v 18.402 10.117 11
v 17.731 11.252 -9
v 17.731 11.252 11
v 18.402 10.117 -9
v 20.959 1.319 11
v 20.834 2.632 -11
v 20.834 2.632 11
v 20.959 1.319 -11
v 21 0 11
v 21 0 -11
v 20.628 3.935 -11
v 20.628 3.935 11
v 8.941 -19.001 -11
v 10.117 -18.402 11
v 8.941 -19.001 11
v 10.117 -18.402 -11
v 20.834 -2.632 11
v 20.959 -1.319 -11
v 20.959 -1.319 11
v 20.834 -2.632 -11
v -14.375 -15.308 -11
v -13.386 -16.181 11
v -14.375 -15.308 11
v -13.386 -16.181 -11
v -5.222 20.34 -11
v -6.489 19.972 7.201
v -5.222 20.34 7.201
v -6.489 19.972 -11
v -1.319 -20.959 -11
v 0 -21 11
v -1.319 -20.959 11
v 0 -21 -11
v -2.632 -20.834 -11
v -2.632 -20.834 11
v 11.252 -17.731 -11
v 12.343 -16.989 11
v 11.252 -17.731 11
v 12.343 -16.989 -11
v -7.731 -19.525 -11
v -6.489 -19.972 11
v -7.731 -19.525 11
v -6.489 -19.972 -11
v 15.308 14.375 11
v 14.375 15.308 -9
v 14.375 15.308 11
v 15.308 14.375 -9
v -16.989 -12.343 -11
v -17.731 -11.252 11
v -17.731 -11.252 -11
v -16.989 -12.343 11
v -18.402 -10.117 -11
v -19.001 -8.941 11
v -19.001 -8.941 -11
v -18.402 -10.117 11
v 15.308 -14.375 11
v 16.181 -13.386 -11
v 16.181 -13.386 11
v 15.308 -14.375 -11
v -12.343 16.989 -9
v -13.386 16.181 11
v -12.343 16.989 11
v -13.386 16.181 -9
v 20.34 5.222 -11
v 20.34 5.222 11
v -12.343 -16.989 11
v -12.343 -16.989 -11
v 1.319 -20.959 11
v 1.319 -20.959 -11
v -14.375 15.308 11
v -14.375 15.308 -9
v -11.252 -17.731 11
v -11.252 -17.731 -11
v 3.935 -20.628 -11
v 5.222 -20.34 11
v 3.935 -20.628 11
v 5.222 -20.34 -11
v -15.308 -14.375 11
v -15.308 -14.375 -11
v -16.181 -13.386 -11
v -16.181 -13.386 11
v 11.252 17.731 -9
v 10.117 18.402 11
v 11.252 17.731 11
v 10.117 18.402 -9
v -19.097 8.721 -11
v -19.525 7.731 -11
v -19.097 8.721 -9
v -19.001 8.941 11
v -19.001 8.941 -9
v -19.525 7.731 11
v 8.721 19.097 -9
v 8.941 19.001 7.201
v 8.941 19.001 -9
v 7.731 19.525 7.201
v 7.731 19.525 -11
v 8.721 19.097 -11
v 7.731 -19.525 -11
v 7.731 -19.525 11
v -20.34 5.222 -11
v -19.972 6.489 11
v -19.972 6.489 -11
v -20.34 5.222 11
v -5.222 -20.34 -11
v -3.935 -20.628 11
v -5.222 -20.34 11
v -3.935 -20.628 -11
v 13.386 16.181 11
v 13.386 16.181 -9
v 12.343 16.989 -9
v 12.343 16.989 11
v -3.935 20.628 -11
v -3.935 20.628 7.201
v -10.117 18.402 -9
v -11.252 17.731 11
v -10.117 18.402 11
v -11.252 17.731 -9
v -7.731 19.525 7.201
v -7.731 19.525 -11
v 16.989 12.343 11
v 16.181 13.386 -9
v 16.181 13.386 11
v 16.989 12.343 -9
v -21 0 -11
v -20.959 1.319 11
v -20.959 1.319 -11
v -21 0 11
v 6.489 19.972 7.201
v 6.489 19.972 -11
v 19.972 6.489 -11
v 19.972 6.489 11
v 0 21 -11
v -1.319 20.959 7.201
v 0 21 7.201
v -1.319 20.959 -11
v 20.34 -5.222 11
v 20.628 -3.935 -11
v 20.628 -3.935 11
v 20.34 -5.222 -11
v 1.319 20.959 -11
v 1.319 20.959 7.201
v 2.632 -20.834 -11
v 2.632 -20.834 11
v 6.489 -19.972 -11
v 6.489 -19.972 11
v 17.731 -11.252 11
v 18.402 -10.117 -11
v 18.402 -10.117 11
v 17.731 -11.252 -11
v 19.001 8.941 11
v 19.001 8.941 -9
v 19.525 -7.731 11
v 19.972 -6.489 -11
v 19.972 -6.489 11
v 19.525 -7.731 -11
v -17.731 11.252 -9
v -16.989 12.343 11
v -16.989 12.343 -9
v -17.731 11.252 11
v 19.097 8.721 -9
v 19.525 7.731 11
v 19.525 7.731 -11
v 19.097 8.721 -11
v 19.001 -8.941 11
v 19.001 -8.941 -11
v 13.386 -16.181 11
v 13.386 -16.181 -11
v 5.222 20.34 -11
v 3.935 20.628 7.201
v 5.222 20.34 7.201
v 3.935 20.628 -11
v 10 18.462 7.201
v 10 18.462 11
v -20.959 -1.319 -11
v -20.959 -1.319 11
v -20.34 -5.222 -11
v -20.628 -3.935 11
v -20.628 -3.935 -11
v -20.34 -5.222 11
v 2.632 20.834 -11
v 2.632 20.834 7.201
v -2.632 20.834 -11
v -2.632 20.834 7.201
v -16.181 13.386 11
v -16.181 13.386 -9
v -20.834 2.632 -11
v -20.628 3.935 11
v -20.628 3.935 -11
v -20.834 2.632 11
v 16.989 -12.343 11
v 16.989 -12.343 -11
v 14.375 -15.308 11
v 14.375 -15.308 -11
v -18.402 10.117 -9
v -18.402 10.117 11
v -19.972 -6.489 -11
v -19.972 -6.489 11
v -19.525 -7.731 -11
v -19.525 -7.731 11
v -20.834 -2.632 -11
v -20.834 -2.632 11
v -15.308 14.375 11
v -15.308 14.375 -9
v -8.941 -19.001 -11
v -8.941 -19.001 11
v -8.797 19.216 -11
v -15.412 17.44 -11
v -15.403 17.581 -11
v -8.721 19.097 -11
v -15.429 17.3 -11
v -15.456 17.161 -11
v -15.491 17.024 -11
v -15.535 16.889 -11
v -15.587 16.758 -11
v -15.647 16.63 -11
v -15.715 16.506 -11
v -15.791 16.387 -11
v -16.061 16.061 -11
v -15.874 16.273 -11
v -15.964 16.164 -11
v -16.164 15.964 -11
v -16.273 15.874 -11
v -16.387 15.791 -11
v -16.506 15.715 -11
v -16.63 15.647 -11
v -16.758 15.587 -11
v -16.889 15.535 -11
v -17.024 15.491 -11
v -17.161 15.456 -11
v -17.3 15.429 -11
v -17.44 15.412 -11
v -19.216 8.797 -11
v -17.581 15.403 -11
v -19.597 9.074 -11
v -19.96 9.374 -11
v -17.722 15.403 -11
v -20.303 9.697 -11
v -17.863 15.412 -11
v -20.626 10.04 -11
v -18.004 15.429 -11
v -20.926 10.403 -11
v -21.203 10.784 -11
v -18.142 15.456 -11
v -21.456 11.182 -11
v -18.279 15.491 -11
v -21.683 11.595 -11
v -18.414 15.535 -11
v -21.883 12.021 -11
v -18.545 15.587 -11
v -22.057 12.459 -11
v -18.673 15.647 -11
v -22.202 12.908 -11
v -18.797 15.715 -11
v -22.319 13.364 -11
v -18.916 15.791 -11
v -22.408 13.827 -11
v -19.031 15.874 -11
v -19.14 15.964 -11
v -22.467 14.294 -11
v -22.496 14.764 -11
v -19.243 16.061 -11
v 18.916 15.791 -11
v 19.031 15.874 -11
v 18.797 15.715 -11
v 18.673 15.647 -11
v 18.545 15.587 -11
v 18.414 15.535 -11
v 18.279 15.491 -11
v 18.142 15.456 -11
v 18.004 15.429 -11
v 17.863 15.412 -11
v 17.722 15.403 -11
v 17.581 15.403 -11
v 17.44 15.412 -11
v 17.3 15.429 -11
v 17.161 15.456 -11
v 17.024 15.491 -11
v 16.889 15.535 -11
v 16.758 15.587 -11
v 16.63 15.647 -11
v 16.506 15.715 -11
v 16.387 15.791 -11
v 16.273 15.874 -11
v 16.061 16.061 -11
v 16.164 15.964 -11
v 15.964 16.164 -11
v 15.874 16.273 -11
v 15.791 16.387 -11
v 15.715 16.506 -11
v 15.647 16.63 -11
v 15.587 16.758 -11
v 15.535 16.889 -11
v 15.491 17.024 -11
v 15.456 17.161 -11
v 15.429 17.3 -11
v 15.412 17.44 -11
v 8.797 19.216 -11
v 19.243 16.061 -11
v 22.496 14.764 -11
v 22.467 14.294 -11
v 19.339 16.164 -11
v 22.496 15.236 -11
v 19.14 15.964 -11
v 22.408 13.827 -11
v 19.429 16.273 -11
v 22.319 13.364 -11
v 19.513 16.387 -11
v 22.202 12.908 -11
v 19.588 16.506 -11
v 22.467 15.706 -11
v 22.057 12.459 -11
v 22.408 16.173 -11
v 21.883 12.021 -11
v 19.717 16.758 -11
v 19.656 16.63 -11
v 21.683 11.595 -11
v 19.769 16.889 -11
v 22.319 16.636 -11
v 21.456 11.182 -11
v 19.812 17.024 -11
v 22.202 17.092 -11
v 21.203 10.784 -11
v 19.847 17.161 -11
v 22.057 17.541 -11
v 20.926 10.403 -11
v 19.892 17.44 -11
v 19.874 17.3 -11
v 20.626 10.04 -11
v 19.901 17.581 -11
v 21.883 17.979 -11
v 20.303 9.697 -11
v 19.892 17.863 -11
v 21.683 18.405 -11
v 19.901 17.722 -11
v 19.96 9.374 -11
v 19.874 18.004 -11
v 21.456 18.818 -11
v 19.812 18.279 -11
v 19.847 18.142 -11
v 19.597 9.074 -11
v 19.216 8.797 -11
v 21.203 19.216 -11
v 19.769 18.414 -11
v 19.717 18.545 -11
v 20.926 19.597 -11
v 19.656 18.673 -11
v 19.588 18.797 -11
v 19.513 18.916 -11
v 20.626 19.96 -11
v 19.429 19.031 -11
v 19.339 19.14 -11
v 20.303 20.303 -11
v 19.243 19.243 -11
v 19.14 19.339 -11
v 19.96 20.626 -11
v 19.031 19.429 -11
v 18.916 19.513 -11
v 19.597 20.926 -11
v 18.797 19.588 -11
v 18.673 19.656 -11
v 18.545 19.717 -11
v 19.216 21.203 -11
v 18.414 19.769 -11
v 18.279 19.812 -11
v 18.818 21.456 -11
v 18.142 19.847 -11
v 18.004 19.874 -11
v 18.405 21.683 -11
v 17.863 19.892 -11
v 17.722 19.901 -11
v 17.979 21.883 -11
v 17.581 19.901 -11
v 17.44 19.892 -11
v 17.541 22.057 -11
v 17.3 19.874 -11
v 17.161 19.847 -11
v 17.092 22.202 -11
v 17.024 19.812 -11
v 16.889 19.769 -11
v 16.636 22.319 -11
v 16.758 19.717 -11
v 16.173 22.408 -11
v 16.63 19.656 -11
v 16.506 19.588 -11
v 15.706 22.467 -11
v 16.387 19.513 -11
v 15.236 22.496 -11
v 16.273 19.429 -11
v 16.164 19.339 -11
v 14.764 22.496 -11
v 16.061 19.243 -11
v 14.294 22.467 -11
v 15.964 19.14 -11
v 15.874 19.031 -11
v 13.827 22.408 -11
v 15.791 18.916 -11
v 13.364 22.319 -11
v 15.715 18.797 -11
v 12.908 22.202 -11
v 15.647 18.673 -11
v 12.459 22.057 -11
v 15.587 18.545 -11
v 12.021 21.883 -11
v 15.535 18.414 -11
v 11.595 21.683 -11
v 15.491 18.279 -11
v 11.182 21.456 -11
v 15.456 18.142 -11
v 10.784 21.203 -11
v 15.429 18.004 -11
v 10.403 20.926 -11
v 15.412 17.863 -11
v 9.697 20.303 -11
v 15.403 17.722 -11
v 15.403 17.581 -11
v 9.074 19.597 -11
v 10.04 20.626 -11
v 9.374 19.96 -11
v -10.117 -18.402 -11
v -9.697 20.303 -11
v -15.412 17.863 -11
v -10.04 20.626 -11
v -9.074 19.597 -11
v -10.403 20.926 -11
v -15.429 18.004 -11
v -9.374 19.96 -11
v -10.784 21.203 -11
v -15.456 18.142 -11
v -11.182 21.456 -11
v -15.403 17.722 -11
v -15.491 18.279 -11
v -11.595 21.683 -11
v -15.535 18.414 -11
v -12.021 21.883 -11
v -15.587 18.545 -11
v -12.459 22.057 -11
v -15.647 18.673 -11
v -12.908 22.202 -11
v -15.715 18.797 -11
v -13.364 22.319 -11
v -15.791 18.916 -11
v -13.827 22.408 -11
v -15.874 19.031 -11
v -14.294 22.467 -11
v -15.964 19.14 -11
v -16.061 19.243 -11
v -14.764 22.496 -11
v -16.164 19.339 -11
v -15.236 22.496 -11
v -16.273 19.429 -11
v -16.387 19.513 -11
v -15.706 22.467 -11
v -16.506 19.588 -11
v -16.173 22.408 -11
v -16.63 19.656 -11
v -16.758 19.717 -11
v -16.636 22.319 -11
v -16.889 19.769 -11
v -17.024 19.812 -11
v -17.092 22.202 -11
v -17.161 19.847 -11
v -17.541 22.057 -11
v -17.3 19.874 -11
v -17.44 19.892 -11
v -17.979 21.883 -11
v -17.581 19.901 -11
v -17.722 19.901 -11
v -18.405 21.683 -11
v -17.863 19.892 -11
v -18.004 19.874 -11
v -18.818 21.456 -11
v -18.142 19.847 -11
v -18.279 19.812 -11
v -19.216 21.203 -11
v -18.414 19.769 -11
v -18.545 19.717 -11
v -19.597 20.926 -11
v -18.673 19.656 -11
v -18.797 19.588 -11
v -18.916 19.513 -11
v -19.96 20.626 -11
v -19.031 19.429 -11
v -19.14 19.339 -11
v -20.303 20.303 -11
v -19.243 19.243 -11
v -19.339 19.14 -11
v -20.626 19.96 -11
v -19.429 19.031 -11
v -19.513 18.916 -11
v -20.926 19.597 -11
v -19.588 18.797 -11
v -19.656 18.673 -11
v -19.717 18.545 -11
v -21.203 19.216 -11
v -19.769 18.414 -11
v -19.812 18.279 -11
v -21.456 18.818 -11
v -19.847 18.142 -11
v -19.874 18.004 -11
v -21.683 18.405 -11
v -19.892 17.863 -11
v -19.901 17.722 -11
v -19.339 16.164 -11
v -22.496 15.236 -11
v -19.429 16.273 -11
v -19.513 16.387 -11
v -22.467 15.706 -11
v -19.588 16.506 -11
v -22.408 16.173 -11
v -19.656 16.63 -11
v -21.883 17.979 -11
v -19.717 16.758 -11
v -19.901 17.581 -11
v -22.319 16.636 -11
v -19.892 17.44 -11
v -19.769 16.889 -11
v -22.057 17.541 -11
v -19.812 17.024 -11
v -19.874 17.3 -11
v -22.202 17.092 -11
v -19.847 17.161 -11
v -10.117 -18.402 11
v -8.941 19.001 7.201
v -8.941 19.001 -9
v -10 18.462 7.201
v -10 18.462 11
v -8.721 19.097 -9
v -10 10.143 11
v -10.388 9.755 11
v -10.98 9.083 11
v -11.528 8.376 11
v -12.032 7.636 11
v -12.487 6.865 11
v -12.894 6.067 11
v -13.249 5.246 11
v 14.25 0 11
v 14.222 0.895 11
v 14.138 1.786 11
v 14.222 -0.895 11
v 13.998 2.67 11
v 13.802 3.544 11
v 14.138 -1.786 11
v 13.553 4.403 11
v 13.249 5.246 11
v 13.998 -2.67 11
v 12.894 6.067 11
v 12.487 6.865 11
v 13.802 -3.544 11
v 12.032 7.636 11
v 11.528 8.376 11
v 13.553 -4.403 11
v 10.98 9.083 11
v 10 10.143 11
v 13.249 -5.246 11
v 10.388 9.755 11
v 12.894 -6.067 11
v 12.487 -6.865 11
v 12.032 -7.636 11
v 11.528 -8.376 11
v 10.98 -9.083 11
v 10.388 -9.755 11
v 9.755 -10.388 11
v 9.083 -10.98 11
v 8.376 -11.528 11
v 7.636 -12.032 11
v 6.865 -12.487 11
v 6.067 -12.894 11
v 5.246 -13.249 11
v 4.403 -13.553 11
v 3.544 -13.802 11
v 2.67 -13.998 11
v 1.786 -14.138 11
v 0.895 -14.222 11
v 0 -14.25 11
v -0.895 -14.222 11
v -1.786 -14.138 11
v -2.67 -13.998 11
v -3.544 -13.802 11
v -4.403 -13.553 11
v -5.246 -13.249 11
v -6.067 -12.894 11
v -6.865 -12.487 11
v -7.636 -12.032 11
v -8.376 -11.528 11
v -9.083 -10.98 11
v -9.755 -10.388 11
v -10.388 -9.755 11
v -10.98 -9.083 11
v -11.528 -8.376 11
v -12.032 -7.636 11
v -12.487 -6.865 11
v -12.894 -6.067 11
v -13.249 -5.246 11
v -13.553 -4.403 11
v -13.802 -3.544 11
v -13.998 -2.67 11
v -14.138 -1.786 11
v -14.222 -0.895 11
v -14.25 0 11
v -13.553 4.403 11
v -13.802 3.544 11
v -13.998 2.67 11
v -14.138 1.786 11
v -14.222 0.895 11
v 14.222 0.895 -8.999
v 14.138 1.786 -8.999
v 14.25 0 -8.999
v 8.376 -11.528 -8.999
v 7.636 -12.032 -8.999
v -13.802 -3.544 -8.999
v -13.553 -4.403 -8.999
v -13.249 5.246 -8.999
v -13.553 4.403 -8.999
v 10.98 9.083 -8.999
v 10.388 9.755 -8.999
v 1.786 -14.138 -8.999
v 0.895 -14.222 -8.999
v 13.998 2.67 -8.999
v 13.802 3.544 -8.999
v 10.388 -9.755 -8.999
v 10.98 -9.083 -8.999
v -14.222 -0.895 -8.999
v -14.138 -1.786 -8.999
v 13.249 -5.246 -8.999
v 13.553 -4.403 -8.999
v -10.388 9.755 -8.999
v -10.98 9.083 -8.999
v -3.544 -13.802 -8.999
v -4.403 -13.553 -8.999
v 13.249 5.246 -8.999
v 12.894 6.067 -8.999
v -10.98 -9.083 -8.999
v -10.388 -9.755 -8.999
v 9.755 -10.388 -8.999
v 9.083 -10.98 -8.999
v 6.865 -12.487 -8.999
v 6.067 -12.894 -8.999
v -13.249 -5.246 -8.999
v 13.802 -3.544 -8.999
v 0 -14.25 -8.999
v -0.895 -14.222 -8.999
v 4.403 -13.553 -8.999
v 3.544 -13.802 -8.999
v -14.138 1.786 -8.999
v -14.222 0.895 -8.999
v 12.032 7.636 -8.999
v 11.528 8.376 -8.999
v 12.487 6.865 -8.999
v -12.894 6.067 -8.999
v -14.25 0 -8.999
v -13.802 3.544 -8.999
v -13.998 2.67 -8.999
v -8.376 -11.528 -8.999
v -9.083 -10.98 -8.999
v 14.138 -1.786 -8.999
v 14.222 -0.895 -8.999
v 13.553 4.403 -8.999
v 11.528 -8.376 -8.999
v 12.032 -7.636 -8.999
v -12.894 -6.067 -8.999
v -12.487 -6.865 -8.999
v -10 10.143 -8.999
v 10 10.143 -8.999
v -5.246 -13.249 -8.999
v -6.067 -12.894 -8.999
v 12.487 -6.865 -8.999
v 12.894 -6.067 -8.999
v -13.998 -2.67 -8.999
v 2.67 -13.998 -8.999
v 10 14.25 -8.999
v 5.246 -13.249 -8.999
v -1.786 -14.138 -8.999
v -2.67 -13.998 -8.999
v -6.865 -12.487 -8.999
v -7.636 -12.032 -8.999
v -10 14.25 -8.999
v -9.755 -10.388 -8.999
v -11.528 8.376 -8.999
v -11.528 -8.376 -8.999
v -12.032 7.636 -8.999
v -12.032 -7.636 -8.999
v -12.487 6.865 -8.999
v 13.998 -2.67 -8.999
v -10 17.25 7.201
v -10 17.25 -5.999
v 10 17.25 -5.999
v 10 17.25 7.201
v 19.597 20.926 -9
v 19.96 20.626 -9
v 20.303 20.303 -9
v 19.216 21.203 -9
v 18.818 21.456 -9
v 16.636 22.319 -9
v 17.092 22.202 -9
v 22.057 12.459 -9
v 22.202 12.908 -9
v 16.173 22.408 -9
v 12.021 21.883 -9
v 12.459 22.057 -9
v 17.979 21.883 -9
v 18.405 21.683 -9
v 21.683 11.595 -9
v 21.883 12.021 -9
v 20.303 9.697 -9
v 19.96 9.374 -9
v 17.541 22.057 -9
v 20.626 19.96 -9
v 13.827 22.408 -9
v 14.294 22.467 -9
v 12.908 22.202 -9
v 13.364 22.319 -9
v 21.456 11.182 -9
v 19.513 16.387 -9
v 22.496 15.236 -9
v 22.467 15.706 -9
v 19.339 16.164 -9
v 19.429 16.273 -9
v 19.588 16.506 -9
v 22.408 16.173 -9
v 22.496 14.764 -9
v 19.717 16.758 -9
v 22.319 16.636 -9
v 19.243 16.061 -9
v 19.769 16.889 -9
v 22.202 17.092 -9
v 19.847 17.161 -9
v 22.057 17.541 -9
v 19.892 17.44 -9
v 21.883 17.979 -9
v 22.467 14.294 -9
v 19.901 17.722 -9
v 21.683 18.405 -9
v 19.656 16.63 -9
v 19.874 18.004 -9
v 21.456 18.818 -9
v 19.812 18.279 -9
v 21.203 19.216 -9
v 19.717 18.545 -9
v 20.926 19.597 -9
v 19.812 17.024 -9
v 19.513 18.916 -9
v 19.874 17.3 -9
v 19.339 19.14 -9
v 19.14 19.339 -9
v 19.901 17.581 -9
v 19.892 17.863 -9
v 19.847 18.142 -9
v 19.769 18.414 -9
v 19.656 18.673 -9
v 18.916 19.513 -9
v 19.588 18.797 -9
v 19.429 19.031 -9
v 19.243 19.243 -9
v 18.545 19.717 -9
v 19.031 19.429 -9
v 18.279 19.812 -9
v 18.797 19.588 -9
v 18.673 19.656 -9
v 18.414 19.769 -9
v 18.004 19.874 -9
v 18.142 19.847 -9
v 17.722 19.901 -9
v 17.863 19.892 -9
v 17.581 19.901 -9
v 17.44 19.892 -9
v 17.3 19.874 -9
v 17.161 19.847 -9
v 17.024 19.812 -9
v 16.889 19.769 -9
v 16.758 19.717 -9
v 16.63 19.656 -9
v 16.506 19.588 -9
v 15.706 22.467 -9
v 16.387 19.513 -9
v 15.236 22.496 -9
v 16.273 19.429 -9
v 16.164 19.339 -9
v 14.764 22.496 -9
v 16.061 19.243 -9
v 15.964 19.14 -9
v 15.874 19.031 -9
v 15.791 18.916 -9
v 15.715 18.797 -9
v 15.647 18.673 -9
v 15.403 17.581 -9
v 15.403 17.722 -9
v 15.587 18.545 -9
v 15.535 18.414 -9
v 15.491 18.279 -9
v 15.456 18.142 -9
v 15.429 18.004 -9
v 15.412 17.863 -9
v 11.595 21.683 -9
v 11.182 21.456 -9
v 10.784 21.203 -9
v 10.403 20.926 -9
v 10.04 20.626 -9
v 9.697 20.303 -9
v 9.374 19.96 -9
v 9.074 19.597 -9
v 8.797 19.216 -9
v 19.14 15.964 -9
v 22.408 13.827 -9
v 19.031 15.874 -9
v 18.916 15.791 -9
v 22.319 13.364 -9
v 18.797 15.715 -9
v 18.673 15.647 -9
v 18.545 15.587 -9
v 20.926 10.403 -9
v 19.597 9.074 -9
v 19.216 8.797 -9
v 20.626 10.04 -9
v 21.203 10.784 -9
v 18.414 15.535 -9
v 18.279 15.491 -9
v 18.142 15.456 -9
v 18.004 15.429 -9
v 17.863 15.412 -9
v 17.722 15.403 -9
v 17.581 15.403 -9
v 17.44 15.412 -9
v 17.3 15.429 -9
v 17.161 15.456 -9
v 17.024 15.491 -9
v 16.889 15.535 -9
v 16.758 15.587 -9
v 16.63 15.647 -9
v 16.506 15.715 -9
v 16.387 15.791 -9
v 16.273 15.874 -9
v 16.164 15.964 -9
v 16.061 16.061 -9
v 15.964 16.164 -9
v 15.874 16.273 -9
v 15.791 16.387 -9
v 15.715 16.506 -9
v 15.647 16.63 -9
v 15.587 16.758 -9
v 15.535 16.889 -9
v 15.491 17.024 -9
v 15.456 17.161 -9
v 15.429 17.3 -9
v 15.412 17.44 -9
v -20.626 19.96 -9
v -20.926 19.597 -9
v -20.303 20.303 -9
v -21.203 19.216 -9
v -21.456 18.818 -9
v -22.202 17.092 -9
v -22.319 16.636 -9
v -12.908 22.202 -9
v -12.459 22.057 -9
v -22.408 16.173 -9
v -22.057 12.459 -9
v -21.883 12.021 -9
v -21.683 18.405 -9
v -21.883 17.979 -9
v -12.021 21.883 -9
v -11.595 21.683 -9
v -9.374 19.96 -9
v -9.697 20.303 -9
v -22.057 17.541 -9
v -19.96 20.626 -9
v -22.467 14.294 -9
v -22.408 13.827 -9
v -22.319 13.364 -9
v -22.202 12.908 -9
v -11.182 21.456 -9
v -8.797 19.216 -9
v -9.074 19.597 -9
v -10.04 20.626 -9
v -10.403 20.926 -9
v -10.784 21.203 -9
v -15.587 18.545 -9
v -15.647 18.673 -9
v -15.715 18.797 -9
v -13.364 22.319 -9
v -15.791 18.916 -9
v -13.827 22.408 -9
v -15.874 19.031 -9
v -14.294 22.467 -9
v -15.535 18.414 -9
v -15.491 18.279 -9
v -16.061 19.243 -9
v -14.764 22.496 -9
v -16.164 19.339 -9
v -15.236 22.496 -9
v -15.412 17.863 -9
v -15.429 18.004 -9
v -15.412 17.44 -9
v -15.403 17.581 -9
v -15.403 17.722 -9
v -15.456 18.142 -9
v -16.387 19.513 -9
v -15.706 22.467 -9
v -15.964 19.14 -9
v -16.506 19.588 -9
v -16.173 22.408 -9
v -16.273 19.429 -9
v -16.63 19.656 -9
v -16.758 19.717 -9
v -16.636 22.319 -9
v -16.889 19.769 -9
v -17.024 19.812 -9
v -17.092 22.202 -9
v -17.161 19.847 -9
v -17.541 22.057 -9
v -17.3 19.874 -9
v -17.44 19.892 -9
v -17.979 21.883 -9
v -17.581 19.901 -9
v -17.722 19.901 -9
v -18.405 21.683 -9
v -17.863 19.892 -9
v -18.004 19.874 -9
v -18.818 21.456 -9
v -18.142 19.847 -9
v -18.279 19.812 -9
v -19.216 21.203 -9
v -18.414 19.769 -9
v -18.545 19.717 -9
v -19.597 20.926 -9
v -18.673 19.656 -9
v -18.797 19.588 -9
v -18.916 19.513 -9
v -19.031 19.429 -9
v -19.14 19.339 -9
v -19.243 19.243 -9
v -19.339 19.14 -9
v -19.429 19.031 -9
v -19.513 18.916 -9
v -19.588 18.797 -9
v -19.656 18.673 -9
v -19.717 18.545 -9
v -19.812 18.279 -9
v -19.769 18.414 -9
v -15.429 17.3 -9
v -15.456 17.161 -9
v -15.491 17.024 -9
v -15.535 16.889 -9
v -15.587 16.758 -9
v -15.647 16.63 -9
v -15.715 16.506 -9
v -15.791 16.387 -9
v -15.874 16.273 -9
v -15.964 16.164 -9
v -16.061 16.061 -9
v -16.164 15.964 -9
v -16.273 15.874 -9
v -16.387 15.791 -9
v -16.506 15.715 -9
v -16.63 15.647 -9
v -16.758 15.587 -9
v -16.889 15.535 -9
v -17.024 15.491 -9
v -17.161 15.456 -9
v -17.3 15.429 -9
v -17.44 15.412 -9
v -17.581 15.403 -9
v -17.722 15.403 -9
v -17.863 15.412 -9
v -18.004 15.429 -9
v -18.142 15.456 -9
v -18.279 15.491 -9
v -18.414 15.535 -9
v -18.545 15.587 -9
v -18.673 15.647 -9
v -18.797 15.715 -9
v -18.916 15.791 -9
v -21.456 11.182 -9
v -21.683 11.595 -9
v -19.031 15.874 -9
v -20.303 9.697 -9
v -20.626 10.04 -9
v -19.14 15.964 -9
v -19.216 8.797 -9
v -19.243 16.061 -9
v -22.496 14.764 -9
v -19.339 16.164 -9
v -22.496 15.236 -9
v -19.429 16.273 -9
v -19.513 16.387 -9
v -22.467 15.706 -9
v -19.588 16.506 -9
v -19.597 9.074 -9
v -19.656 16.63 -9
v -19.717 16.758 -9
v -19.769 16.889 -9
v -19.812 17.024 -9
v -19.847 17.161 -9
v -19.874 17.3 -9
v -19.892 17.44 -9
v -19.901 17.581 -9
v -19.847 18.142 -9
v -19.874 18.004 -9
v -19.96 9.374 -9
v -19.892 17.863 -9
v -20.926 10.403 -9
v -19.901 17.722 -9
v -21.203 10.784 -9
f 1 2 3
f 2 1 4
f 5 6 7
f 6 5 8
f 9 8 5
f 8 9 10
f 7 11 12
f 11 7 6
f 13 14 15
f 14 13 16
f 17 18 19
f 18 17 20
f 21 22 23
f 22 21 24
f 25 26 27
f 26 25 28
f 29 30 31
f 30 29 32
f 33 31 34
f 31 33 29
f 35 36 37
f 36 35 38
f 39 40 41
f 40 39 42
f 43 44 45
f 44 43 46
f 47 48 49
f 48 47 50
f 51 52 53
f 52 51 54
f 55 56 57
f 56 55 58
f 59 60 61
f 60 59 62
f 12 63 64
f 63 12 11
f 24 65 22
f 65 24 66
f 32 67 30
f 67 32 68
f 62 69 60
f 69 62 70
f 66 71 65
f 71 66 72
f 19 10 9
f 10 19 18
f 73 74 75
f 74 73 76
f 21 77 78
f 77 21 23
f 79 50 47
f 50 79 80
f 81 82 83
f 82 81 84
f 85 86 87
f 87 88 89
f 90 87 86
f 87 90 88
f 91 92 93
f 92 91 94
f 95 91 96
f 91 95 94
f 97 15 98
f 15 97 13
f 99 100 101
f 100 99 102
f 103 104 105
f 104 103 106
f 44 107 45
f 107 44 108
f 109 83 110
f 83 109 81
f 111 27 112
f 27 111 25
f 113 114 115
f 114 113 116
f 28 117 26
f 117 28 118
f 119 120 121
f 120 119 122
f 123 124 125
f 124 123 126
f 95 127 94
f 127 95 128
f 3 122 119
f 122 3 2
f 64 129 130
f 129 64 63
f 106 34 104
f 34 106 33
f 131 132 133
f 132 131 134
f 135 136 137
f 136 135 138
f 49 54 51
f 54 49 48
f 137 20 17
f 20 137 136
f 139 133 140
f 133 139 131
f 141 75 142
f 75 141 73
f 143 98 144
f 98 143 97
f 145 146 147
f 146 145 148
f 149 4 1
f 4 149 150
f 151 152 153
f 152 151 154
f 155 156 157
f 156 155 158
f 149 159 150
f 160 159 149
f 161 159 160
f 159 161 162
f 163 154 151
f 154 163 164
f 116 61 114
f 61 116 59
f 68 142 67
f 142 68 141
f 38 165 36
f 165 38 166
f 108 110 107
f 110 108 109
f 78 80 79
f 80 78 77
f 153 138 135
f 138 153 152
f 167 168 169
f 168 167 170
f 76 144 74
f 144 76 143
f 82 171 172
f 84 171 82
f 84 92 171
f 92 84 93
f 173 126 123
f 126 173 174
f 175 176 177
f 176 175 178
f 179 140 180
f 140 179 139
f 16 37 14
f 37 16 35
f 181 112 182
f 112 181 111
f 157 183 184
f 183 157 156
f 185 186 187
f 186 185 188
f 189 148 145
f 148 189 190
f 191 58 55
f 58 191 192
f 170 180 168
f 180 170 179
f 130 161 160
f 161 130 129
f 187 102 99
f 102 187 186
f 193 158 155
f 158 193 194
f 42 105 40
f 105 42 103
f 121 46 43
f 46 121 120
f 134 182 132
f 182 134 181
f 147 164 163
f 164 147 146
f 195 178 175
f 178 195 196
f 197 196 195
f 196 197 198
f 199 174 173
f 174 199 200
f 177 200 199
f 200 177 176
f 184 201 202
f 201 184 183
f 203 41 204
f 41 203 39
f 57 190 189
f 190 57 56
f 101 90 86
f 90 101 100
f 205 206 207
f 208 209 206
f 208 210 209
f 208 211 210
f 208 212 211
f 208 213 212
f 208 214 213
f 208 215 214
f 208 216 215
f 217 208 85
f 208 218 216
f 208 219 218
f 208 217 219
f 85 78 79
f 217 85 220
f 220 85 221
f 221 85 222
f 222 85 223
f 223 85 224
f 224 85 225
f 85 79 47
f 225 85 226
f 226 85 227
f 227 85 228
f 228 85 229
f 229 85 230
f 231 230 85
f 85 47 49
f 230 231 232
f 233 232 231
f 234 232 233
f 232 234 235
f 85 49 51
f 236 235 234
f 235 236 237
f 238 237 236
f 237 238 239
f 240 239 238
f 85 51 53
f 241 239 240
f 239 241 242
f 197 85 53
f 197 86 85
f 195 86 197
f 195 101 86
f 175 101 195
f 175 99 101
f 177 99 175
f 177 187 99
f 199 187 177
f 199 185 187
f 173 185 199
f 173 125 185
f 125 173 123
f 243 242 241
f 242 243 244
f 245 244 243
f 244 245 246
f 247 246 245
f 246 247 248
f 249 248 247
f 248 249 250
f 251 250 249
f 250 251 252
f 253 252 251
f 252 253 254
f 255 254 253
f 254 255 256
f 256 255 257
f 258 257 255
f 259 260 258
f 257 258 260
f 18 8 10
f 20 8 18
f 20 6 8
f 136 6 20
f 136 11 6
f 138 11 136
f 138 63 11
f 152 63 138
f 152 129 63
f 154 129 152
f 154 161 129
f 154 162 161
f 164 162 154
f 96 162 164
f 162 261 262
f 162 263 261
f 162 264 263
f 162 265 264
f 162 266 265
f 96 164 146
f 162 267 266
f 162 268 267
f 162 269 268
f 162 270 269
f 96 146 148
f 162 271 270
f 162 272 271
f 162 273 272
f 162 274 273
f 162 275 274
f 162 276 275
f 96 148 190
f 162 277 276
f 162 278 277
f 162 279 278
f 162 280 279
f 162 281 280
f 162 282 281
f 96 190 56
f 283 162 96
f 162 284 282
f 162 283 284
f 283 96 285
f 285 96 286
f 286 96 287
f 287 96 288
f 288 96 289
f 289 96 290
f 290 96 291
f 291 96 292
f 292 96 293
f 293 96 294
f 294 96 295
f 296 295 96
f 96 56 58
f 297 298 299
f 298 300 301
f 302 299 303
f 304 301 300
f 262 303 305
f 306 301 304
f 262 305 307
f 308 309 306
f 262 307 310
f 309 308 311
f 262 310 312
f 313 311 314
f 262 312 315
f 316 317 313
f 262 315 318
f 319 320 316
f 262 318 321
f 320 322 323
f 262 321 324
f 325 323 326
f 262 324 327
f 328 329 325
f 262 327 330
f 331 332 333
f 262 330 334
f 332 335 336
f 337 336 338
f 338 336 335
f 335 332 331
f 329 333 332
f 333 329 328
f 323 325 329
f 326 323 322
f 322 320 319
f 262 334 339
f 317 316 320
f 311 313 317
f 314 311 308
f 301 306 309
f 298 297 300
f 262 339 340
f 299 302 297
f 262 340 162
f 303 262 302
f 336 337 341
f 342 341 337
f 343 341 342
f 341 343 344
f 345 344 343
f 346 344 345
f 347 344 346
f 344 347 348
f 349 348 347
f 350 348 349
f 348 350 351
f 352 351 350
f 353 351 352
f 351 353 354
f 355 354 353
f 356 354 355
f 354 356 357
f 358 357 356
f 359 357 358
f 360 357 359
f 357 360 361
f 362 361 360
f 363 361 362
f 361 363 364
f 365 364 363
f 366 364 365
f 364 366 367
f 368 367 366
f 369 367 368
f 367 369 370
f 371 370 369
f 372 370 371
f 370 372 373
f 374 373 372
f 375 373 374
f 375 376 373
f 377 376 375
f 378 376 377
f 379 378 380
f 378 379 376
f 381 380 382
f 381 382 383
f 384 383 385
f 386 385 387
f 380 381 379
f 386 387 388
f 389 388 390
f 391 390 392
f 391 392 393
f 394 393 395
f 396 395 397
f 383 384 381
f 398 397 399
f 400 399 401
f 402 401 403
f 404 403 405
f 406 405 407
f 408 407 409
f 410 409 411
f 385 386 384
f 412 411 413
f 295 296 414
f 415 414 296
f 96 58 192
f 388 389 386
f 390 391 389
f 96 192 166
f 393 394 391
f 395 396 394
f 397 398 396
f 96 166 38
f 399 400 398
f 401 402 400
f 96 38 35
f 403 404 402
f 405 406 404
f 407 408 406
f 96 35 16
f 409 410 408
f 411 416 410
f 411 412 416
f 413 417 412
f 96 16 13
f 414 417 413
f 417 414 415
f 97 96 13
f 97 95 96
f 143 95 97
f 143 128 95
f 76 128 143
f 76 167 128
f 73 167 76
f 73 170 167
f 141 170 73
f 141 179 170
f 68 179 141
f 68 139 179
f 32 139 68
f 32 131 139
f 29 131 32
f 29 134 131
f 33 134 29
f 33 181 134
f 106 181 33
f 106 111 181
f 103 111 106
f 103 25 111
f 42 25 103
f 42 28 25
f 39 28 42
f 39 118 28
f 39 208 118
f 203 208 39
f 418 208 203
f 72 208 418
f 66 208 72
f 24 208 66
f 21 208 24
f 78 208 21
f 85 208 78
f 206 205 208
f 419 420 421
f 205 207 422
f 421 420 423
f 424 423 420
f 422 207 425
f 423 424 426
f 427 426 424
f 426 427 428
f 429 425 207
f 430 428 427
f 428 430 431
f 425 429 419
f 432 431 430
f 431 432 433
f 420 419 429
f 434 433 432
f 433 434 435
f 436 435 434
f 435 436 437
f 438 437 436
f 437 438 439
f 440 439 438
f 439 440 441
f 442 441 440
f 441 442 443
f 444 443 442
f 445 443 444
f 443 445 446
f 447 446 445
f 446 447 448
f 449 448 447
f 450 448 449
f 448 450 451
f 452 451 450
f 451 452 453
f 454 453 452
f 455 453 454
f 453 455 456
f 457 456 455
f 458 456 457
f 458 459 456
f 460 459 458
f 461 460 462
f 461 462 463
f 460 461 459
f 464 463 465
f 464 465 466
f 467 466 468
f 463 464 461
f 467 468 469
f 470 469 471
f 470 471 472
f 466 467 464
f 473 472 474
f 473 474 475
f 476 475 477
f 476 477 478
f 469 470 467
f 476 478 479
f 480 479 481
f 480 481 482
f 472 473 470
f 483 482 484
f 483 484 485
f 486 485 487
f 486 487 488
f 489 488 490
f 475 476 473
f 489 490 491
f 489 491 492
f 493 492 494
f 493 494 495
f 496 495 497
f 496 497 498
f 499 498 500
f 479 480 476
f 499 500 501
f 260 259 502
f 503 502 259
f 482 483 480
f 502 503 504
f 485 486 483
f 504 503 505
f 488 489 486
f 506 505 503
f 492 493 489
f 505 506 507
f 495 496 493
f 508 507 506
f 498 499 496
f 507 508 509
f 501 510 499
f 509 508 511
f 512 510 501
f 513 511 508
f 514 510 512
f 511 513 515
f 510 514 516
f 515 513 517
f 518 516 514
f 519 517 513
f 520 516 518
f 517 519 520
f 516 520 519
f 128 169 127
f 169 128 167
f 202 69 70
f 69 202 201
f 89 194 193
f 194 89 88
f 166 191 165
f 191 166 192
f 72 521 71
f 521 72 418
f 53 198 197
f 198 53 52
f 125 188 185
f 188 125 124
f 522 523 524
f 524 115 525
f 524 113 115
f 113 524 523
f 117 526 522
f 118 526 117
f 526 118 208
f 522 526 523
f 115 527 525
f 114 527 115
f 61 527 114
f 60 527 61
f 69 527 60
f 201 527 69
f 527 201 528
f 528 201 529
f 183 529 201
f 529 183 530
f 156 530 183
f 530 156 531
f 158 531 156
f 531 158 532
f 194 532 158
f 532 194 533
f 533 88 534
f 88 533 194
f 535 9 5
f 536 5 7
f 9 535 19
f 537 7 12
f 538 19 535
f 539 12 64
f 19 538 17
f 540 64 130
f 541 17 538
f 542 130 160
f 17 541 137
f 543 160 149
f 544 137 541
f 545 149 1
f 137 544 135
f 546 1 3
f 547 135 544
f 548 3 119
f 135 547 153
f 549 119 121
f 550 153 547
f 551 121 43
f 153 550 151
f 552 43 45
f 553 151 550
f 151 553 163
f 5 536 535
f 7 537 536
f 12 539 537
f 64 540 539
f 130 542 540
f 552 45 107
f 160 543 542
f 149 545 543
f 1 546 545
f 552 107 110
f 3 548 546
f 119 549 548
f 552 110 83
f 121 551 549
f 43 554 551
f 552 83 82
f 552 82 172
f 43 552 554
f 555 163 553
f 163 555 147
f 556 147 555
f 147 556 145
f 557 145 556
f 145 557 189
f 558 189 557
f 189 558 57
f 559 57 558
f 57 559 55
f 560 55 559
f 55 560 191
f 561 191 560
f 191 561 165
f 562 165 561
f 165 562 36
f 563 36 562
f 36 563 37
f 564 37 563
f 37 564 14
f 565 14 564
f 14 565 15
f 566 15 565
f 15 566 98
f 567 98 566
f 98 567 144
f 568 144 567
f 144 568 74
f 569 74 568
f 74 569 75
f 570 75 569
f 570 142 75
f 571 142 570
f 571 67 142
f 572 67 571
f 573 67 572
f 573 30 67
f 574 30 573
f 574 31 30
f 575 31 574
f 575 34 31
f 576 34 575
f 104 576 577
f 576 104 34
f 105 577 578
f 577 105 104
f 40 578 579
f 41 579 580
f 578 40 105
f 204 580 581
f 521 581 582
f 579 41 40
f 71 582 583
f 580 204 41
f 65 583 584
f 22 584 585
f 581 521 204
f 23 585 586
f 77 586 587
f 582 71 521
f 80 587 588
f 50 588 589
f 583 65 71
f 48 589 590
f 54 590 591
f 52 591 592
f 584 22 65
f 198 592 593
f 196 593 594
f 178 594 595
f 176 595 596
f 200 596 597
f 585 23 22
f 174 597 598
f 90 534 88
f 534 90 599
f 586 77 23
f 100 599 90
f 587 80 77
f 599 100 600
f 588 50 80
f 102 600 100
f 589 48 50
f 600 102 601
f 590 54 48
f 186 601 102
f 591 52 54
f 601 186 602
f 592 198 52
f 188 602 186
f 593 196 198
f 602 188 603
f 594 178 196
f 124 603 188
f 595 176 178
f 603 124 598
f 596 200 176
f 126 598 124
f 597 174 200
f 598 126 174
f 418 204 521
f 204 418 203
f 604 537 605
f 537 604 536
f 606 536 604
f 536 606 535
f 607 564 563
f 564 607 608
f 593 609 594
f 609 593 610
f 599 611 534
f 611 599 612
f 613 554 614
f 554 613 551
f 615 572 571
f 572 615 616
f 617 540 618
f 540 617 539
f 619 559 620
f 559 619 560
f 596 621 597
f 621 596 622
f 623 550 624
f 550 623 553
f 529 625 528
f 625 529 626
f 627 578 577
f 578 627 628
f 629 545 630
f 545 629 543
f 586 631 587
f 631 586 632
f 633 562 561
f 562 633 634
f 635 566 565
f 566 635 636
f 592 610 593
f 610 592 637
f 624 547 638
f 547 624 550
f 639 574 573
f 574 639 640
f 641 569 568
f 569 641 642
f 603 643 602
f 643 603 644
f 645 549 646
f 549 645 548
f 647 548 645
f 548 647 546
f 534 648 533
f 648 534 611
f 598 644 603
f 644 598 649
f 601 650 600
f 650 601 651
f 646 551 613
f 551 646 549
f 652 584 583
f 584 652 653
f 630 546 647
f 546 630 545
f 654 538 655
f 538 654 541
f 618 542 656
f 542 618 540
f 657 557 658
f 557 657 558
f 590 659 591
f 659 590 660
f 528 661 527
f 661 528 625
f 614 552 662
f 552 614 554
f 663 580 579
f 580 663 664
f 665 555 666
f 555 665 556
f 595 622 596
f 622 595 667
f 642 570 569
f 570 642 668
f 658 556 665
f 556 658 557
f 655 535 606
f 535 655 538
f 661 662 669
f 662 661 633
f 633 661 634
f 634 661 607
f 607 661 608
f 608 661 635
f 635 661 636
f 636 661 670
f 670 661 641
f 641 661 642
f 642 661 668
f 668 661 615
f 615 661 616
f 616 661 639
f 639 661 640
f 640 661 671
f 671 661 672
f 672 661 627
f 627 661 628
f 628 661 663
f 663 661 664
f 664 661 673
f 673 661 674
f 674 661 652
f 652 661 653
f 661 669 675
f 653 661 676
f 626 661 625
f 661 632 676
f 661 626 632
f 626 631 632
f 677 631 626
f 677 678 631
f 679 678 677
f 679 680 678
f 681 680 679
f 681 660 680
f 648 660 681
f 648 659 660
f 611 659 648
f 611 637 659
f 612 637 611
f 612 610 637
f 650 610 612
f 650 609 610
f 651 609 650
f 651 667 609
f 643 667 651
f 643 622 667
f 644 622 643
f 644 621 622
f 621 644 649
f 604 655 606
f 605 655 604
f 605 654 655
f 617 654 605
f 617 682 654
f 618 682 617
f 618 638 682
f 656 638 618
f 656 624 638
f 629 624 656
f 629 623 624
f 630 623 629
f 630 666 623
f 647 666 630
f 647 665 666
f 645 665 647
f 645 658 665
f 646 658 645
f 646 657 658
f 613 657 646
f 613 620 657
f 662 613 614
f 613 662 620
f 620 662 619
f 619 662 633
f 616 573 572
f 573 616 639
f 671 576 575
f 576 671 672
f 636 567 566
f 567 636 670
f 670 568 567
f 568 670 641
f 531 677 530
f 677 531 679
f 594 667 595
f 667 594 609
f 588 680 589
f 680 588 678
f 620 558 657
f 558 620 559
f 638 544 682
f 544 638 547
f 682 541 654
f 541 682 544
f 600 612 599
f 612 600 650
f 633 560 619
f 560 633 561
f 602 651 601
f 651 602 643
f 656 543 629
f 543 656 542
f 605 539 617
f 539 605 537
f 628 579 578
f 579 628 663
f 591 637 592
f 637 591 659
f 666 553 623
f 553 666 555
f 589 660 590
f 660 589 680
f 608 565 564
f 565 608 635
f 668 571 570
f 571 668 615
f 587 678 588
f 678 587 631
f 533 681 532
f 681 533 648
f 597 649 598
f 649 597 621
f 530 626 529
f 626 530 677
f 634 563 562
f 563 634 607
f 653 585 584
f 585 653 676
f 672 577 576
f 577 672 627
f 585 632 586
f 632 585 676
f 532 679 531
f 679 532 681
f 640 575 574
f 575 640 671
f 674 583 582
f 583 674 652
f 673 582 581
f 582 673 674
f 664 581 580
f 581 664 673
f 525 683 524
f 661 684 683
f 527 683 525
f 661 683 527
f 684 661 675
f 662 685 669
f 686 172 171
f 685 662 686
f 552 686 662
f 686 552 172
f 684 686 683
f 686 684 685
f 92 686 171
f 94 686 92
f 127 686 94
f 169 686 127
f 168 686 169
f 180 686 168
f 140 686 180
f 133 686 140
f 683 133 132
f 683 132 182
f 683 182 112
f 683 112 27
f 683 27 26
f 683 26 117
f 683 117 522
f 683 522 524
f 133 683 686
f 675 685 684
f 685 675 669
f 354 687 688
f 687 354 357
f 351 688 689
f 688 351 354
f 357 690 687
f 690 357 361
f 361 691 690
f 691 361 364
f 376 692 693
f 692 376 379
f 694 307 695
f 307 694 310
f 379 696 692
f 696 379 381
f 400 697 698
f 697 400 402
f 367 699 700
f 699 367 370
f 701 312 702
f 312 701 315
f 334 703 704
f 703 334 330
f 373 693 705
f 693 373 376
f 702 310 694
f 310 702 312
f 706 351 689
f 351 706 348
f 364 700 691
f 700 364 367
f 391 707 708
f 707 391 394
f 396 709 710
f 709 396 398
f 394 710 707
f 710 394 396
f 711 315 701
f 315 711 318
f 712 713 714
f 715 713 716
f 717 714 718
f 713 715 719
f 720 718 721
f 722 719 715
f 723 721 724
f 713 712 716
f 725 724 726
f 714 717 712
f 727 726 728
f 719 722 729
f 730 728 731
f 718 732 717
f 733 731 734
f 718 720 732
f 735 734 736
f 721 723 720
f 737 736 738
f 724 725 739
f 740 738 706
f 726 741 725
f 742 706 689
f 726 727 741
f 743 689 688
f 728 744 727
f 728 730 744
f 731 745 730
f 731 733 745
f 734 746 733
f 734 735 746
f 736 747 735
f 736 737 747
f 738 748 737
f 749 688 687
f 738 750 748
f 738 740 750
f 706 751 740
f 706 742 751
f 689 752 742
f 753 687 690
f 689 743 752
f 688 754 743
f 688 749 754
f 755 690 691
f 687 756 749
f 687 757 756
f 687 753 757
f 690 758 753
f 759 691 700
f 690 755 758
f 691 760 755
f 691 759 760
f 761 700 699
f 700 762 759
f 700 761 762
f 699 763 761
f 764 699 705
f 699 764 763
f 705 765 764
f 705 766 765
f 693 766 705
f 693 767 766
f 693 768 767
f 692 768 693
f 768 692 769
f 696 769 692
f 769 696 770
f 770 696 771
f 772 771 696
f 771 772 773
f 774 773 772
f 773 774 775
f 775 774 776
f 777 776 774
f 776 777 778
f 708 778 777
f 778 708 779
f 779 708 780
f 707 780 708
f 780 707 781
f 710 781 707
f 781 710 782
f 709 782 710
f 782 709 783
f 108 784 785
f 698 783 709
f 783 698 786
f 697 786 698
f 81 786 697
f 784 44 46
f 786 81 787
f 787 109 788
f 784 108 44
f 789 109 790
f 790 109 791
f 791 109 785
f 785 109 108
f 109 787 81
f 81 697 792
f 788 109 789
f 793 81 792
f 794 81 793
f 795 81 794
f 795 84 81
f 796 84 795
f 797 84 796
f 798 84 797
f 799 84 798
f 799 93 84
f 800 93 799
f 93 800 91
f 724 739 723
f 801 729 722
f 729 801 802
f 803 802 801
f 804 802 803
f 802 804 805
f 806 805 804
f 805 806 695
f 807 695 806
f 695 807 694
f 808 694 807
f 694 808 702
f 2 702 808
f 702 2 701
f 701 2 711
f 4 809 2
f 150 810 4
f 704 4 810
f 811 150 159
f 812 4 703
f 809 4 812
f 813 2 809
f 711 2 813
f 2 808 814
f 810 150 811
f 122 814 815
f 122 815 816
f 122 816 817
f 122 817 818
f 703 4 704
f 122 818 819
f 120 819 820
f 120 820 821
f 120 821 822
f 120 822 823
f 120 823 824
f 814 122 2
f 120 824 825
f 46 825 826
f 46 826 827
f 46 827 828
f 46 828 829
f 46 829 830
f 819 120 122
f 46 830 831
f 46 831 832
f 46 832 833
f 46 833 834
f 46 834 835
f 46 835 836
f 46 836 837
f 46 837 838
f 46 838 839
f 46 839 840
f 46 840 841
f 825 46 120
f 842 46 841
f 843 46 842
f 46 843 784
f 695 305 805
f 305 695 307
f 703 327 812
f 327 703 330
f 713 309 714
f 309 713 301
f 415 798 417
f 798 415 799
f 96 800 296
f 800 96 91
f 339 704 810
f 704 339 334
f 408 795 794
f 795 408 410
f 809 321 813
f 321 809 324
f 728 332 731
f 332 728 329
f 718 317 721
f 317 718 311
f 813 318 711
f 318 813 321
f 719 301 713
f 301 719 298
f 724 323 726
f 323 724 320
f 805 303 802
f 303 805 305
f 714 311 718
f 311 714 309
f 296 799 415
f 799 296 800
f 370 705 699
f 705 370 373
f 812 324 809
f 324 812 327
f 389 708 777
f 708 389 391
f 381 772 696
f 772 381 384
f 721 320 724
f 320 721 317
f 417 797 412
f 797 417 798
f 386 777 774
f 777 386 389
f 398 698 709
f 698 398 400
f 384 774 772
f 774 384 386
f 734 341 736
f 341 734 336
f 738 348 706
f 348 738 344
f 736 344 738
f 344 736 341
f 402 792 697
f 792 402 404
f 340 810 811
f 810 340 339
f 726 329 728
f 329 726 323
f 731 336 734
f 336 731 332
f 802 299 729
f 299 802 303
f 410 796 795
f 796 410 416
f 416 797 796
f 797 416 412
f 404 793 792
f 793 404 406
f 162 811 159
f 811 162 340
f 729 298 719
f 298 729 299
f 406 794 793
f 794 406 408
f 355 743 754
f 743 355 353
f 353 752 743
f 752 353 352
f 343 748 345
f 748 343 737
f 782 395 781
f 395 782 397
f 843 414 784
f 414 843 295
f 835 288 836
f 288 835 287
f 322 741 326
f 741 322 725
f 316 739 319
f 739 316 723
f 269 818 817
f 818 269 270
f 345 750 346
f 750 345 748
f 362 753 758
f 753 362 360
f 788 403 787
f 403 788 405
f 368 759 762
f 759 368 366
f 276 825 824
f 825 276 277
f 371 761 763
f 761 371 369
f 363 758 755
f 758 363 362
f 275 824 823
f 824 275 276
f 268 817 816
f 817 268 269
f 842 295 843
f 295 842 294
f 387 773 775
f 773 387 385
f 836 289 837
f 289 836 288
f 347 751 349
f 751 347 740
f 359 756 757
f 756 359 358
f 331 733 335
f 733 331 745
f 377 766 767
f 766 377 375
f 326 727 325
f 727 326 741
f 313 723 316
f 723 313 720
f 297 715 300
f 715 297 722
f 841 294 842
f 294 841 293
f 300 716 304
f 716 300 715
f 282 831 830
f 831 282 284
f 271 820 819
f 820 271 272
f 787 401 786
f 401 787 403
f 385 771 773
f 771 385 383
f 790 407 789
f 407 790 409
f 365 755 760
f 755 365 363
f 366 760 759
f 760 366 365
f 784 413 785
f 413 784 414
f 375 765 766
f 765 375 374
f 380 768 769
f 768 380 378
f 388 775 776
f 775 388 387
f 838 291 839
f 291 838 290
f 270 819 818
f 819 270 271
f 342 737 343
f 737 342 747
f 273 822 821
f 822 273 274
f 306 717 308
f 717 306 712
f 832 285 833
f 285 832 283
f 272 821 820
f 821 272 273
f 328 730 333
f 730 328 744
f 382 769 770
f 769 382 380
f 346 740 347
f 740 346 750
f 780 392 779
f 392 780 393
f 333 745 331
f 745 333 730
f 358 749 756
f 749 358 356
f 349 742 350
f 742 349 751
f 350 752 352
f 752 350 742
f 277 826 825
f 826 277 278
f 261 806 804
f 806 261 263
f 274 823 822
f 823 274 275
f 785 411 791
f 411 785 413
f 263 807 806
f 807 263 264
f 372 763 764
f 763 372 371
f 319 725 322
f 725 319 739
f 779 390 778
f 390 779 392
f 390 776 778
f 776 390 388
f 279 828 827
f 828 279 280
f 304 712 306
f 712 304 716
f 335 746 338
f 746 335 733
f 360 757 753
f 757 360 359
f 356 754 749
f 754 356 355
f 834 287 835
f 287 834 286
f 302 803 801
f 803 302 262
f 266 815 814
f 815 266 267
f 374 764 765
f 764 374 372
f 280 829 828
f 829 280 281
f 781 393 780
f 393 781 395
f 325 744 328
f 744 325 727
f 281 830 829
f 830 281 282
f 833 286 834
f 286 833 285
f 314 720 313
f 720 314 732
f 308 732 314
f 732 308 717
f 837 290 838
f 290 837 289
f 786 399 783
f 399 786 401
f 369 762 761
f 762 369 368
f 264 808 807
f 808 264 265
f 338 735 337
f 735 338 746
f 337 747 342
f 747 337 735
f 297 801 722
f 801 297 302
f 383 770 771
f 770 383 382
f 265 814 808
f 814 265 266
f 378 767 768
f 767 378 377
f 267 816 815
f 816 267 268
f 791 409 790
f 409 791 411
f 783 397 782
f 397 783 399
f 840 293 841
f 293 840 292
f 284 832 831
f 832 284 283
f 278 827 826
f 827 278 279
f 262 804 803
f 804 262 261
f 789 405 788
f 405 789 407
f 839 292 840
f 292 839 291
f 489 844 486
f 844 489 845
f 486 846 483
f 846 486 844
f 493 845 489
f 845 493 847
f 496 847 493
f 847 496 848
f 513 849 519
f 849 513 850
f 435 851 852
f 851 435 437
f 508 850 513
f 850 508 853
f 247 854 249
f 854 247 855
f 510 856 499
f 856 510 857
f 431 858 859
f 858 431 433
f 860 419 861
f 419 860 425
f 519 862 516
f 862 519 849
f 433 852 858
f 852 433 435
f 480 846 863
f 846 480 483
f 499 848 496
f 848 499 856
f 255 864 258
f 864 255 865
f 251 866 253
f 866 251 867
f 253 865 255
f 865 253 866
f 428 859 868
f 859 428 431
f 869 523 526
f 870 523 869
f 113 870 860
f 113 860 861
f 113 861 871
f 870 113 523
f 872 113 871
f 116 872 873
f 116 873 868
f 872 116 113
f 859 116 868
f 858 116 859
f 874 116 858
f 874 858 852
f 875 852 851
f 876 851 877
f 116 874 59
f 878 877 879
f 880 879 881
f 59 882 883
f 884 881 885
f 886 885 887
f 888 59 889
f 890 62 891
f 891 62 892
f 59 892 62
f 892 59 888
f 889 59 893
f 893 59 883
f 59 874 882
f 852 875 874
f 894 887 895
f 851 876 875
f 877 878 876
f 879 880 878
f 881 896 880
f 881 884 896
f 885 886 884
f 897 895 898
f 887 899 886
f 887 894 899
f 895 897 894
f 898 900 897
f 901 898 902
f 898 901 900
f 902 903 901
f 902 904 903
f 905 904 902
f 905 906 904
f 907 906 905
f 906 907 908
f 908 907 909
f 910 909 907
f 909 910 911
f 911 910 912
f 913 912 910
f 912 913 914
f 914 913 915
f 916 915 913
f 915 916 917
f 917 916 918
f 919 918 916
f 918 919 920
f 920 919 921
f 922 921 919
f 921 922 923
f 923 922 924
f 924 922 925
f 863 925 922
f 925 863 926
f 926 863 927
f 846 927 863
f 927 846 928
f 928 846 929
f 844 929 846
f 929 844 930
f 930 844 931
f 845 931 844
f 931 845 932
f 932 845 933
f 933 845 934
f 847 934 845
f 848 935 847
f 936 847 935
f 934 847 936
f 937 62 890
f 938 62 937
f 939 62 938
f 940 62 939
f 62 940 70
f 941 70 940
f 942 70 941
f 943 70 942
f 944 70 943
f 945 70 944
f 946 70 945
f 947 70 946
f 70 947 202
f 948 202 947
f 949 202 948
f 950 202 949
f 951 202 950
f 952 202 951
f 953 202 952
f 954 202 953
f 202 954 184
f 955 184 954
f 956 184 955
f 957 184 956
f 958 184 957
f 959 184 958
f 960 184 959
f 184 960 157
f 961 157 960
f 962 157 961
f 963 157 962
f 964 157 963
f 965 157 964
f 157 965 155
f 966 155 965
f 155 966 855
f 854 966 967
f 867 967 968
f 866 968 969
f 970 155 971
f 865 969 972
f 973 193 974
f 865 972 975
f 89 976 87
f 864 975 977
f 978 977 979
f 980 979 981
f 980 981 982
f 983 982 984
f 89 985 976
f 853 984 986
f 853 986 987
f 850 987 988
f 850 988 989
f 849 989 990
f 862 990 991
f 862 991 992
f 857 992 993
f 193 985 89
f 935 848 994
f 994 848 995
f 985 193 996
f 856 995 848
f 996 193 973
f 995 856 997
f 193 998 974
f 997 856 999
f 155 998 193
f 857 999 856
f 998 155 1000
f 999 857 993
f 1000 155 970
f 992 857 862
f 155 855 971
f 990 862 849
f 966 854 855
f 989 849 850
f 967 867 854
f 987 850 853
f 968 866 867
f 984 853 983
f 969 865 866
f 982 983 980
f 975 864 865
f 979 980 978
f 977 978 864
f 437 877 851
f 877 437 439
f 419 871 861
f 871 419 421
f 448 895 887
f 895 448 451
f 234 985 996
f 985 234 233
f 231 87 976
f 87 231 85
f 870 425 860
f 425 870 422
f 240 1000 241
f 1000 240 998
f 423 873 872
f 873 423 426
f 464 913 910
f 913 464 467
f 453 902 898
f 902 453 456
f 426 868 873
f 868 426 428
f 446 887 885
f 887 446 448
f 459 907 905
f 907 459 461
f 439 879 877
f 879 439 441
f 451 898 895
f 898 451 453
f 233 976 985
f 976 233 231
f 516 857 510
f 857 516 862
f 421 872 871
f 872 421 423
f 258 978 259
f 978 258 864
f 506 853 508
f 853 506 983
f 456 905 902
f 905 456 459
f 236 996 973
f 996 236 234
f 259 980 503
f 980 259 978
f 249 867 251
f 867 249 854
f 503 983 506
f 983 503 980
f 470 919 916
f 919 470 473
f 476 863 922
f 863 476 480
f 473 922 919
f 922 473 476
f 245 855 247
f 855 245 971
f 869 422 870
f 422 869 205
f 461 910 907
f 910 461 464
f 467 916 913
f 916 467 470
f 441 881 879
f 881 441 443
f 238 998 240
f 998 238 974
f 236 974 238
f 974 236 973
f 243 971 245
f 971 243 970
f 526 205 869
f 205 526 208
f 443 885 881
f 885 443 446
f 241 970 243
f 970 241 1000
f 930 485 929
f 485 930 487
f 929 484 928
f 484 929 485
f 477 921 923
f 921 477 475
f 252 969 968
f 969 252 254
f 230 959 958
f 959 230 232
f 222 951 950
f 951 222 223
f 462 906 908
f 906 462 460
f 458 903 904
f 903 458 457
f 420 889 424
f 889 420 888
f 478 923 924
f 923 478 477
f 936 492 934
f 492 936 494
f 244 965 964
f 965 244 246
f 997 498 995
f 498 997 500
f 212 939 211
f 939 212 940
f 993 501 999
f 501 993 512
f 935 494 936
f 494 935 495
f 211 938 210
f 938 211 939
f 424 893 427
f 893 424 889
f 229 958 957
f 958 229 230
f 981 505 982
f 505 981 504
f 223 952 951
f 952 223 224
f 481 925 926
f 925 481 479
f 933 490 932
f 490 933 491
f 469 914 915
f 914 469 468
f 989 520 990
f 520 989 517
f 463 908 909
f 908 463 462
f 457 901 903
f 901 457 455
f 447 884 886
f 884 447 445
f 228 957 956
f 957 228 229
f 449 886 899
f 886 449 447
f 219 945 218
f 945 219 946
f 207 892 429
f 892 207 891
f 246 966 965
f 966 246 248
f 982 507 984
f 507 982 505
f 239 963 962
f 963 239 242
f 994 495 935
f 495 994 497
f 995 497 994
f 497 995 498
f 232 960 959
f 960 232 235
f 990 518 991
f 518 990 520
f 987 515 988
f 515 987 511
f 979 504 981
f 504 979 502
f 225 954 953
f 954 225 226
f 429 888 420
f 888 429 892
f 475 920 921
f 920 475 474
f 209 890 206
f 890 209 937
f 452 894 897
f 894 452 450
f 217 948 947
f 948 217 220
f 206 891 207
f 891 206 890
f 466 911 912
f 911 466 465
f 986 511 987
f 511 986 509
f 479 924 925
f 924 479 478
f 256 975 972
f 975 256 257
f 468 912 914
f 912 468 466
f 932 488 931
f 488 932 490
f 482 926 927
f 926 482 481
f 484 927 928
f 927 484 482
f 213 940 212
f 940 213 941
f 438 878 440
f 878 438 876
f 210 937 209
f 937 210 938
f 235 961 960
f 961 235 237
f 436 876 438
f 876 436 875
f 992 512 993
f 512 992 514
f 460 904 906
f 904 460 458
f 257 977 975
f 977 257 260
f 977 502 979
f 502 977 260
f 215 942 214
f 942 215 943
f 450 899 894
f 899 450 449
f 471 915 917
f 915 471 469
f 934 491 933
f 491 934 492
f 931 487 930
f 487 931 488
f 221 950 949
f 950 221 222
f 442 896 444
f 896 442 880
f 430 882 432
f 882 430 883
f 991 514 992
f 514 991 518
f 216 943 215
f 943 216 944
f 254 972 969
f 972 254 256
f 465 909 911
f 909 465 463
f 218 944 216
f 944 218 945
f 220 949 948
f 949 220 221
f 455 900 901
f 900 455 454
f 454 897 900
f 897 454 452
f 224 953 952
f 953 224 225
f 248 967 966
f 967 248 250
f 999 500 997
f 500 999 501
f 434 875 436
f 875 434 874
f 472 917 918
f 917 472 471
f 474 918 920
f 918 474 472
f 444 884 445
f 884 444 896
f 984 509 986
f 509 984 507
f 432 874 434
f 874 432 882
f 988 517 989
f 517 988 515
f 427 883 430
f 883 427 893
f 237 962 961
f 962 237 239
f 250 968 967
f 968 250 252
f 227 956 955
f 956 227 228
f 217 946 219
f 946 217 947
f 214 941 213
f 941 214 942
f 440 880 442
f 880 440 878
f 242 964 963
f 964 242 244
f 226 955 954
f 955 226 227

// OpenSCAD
$fn=100;
FUDGE = 0.001;

OutsideD = 42; // will go out to the edges of the 28byj-48 stepper
  // motor screw holes
OutsideH = 22;
StepperD = 31.5;
StepperDI = 28.5;
WireH = 3.8;
WireHole = 5;
StepperH = 20;
earD = 15;
earH = 2;
earHole = 4.5;

// Cut out for the wired side (bottom) of the stepper motor
// Need xtra room -x to cover the cylindar and +x for the wire channel
module WireRelief(h=4, od=4, id=3, wireH=1, xtra=7) {
rotate([90,0,90])
    linear_extrude(height=h, center=true, convexity=5) {
        polygon(points=[[-xtra,0],
            [0,0],
            [od-id,od-id],
            [od-id,h-wireH],
            [(od-id)+wireH,h-wireH],
            [(od-id)+wireH,h],
            [0,h],
            [-xtra,h],
            [-xtra,0]]);
    }
}


union() {
    difference(){
        cylinder(h=OutsideH, d=OutsideD, center=true);
        translate([0,0,(OutsideH - StepperH)/2 + FUDGE])
            cylinder(h=StepperH, d=StepperDI, center=true);
        translate([0,StepperDI/2,
            -(StepperH/2-(OutsideH - StepperH)/2 - FUDGE)])
            WireRelief(h=StepperH, od=StepperD, id=StepperDI, wireH=WireH);
    }
    // Will need an attachment surface someplace
    // How about two ears on the bottom with holes for screws
    translate([OutsideD/2.8,OutsideD/2.8,-(OutsideH/2-earH/2)])
        rotate([0,0,45])
            difference(){
                cylinder(h=earH, d=earD, center=true);
                translate([earD/4,0,0])
                    cylinder(h=earH+FUDGE, d=earHole, center=true);
            }
    translate([-OutsideD/2.8,OutsideD/2.8,-(OutsideH/2-earH/2)])
        rotate([0,0,135])
            difference(){
                cylinder(h=earH, d=earD, center=true);
                translate([earD/4,0,0])
                    cylinder(h=earH+FUDGE, d=earHole, center=true);
            }
}
